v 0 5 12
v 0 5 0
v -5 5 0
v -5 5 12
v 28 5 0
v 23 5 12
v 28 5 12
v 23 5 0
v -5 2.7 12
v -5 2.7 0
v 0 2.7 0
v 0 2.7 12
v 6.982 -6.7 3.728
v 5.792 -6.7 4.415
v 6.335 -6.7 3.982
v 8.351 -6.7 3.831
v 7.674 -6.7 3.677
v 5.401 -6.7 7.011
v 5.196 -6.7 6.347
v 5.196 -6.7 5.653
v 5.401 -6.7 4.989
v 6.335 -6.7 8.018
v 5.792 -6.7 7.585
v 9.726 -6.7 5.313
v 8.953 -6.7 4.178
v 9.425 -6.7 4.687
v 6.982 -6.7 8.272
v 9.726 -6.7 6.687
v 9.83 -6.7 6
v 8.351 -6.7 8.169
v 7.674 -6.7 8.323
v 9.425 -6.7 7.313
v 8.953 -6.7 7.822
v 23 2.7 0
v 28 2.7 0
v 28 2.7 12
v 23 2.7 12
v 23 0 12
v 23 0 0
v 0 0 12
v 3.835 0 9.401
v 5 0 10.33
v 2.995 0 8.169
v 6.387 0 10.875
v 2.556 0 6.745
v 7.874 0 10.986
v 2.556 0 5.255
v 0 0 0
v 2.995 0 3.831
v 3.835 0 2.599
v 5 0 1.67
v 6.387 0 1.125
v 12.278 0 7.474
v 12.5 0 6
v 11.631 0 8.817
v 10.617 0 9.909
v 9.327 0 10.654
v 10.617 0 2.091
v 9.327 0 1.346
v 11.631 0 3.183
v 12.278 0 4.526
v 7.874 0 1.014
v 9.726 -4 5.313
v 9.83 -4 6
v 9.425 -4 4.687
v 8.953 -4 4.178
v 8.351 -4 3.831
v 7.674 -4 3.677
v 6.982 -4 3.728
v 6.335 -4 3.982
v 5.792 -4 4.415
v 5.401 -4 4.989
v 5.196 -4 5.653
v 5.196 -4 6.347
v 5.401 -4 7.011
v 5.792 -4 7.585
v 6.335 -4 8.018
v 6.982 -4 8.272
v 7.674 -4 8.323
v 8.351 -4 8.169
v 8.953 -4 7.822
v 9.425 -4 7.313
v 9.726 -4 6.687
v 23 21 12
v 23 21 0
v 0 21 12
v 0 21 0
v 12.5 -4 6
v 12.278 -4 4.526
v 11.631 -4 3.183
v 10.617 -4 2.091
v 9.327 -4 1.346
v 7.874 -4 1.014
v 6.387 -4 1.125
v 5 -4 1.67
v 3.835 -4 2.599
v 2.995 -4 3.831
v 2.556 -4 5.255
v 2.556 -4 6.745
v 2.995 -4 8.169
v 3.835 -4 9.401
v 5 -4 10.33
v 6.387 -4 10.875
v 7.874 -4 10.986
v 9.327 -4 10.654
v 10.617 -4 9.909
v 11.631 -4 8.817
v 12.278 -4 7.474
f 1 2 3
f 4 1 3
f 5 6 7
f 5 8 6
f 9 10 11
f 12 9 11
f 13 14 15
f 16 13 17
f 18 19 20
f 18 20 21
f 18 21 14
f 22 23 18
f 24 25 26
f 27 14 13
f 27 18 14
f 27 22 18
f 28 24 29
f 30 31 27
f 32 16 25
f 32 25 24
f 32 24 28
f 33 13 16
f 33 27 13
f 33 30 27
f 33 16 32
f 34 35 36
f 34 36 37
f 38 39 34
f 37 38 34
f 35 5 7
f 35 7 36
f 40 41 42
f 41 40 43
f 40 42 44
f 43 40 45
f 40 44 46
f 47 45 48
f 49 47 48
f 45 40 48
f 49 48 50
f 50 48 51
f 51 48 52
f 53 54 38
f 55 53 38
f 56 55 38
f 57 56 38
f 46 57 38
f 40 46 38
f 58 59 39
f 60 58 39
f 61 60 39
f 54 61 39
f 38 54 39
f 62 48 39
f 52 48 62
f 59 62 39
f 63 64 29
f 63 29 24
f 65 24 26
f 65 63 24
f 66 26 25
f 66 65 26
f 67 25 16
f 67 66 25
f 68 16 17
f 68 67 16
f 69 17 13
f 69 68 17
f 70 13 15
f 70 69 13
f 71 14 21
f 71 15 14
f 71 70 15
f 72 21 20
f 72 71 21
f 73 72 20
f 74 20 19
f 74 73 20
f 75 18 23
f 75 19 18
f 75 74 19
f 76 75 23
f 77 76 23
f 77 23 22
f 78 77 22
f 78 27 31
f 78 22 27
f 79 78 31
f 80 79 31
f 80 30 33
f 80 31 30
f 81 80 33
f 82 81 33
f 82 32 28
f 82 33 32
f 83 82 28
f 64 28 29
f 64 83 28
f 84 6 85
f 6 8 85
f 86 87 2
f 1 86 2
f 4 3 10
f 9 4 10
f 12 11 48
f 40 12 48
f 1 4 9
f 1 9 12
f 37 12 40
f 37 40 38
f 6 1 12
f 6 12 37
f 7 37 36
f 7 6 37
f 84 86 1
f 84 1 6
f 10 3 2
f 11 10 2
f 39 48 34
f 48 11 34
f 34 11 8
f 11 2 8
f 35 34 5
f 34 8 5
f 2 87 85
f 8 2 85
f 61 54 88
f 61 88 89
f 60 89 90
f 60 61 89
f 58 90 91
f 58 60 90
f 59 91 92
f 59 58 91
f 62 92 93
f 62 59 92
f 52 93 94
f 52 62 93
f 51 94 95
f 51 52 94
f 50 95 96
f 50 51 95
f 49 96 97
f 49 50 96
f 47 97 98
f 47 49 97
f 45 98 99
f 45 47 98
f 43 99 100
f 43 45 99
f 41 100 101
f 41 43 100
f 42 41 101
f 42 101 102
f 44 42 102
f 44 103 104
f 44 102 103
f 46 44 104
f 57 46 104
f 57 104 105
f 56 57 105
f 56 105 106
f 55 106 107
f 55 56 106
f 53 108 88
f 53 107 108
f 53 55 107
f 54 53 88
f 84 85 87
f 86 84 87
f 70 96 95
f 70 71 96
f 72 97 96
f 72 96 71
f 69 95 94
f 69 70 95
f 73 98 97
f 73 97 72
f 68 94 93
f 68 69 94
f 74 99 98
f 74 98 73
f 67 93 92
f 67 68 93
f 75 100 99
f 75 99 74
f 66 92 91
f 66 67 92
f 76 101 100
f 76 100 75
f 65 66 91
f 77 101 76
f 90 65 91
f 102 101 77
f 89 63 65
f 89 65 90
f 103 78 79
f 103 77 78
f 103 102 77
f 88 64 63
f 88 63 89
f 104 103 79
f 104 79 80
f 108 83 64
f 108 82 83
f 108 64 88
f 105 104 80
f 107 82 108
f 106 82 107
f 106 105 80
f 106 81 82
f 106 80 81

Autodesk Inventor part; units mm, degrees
ref_plane "YZ Plane" through (0, 0, 0) normal (1, 0, 0) x (0, 1, 0)
ref_plane "XZ Plane" through (0, 0, 0) normal (0, 1, 0) x (-1, 0, 0)
ref_plane "XY Plane" through (0, 0, 0) normal (0, 0, 1) x (1, 0, 0)
sketch "Boceto1" plane through (0, 0, 0) normal (0, 0, 1) x (1, 0, 0)
  line L0 (0, 0) -> (23, 0)
  line L1 (23, 21) -> (0, 21)
  line L2 (23, 5) -> (28, 5)
  line L3 (28, 5) -> (28, 2.7)
  line L4 (28, 2.7) -> (23, 2.7)
  line L5 (0, 5) -> (-5, 5)
  line L6 (-5, 5) -> (-5, 2.7)
  line L7 (-5, 2.7) -> (0, 2.7)
  line L8 (23, 0) -> (23, 2.7)
  line L9 (23, 5) -> (23, 21)
  line L10 (0, 21) -> (0, 5)
  line L11 (0, 2.7) -> (0, 0)
  dimension "d0" = 23
  dimension "d1" = 21
  dimension "d8" = 5
  dimension "d9" = 2.3
  dimension "d10" = 5
  dimension "d11" = 2.3
extrude "Extrusión1" add sketch "Boceto1" along normal blind 12
sketch "Boceto2" plane through (0, 0, 0) normal (0, -1, 0) x (1, 0, 0)
  line L0 (0, 0) -> (0, 12) projected
  circle A0 centre (7.5, 6) radius 5
  dimension "d4" = 10
  dimension "d5" = 7.5
extrude "Extrusión2" add sketch "Boceto2" along normal blind 4
sketch "Boceto3" plane through (7.5, -4, 6) normal (0, -1, 0) x (1, 0, 0)
  circle A0 centre (0, 0) radius 5 projected
  circle A1 centre (0, 0) radius 2.33
  point P0 (-7.5, -6)
  dimension "d12" = 4.66
extrude "Extrusión3" add sketch "Boceto3" along normal blind 2.7 contours A1
properties part number "Servo"
